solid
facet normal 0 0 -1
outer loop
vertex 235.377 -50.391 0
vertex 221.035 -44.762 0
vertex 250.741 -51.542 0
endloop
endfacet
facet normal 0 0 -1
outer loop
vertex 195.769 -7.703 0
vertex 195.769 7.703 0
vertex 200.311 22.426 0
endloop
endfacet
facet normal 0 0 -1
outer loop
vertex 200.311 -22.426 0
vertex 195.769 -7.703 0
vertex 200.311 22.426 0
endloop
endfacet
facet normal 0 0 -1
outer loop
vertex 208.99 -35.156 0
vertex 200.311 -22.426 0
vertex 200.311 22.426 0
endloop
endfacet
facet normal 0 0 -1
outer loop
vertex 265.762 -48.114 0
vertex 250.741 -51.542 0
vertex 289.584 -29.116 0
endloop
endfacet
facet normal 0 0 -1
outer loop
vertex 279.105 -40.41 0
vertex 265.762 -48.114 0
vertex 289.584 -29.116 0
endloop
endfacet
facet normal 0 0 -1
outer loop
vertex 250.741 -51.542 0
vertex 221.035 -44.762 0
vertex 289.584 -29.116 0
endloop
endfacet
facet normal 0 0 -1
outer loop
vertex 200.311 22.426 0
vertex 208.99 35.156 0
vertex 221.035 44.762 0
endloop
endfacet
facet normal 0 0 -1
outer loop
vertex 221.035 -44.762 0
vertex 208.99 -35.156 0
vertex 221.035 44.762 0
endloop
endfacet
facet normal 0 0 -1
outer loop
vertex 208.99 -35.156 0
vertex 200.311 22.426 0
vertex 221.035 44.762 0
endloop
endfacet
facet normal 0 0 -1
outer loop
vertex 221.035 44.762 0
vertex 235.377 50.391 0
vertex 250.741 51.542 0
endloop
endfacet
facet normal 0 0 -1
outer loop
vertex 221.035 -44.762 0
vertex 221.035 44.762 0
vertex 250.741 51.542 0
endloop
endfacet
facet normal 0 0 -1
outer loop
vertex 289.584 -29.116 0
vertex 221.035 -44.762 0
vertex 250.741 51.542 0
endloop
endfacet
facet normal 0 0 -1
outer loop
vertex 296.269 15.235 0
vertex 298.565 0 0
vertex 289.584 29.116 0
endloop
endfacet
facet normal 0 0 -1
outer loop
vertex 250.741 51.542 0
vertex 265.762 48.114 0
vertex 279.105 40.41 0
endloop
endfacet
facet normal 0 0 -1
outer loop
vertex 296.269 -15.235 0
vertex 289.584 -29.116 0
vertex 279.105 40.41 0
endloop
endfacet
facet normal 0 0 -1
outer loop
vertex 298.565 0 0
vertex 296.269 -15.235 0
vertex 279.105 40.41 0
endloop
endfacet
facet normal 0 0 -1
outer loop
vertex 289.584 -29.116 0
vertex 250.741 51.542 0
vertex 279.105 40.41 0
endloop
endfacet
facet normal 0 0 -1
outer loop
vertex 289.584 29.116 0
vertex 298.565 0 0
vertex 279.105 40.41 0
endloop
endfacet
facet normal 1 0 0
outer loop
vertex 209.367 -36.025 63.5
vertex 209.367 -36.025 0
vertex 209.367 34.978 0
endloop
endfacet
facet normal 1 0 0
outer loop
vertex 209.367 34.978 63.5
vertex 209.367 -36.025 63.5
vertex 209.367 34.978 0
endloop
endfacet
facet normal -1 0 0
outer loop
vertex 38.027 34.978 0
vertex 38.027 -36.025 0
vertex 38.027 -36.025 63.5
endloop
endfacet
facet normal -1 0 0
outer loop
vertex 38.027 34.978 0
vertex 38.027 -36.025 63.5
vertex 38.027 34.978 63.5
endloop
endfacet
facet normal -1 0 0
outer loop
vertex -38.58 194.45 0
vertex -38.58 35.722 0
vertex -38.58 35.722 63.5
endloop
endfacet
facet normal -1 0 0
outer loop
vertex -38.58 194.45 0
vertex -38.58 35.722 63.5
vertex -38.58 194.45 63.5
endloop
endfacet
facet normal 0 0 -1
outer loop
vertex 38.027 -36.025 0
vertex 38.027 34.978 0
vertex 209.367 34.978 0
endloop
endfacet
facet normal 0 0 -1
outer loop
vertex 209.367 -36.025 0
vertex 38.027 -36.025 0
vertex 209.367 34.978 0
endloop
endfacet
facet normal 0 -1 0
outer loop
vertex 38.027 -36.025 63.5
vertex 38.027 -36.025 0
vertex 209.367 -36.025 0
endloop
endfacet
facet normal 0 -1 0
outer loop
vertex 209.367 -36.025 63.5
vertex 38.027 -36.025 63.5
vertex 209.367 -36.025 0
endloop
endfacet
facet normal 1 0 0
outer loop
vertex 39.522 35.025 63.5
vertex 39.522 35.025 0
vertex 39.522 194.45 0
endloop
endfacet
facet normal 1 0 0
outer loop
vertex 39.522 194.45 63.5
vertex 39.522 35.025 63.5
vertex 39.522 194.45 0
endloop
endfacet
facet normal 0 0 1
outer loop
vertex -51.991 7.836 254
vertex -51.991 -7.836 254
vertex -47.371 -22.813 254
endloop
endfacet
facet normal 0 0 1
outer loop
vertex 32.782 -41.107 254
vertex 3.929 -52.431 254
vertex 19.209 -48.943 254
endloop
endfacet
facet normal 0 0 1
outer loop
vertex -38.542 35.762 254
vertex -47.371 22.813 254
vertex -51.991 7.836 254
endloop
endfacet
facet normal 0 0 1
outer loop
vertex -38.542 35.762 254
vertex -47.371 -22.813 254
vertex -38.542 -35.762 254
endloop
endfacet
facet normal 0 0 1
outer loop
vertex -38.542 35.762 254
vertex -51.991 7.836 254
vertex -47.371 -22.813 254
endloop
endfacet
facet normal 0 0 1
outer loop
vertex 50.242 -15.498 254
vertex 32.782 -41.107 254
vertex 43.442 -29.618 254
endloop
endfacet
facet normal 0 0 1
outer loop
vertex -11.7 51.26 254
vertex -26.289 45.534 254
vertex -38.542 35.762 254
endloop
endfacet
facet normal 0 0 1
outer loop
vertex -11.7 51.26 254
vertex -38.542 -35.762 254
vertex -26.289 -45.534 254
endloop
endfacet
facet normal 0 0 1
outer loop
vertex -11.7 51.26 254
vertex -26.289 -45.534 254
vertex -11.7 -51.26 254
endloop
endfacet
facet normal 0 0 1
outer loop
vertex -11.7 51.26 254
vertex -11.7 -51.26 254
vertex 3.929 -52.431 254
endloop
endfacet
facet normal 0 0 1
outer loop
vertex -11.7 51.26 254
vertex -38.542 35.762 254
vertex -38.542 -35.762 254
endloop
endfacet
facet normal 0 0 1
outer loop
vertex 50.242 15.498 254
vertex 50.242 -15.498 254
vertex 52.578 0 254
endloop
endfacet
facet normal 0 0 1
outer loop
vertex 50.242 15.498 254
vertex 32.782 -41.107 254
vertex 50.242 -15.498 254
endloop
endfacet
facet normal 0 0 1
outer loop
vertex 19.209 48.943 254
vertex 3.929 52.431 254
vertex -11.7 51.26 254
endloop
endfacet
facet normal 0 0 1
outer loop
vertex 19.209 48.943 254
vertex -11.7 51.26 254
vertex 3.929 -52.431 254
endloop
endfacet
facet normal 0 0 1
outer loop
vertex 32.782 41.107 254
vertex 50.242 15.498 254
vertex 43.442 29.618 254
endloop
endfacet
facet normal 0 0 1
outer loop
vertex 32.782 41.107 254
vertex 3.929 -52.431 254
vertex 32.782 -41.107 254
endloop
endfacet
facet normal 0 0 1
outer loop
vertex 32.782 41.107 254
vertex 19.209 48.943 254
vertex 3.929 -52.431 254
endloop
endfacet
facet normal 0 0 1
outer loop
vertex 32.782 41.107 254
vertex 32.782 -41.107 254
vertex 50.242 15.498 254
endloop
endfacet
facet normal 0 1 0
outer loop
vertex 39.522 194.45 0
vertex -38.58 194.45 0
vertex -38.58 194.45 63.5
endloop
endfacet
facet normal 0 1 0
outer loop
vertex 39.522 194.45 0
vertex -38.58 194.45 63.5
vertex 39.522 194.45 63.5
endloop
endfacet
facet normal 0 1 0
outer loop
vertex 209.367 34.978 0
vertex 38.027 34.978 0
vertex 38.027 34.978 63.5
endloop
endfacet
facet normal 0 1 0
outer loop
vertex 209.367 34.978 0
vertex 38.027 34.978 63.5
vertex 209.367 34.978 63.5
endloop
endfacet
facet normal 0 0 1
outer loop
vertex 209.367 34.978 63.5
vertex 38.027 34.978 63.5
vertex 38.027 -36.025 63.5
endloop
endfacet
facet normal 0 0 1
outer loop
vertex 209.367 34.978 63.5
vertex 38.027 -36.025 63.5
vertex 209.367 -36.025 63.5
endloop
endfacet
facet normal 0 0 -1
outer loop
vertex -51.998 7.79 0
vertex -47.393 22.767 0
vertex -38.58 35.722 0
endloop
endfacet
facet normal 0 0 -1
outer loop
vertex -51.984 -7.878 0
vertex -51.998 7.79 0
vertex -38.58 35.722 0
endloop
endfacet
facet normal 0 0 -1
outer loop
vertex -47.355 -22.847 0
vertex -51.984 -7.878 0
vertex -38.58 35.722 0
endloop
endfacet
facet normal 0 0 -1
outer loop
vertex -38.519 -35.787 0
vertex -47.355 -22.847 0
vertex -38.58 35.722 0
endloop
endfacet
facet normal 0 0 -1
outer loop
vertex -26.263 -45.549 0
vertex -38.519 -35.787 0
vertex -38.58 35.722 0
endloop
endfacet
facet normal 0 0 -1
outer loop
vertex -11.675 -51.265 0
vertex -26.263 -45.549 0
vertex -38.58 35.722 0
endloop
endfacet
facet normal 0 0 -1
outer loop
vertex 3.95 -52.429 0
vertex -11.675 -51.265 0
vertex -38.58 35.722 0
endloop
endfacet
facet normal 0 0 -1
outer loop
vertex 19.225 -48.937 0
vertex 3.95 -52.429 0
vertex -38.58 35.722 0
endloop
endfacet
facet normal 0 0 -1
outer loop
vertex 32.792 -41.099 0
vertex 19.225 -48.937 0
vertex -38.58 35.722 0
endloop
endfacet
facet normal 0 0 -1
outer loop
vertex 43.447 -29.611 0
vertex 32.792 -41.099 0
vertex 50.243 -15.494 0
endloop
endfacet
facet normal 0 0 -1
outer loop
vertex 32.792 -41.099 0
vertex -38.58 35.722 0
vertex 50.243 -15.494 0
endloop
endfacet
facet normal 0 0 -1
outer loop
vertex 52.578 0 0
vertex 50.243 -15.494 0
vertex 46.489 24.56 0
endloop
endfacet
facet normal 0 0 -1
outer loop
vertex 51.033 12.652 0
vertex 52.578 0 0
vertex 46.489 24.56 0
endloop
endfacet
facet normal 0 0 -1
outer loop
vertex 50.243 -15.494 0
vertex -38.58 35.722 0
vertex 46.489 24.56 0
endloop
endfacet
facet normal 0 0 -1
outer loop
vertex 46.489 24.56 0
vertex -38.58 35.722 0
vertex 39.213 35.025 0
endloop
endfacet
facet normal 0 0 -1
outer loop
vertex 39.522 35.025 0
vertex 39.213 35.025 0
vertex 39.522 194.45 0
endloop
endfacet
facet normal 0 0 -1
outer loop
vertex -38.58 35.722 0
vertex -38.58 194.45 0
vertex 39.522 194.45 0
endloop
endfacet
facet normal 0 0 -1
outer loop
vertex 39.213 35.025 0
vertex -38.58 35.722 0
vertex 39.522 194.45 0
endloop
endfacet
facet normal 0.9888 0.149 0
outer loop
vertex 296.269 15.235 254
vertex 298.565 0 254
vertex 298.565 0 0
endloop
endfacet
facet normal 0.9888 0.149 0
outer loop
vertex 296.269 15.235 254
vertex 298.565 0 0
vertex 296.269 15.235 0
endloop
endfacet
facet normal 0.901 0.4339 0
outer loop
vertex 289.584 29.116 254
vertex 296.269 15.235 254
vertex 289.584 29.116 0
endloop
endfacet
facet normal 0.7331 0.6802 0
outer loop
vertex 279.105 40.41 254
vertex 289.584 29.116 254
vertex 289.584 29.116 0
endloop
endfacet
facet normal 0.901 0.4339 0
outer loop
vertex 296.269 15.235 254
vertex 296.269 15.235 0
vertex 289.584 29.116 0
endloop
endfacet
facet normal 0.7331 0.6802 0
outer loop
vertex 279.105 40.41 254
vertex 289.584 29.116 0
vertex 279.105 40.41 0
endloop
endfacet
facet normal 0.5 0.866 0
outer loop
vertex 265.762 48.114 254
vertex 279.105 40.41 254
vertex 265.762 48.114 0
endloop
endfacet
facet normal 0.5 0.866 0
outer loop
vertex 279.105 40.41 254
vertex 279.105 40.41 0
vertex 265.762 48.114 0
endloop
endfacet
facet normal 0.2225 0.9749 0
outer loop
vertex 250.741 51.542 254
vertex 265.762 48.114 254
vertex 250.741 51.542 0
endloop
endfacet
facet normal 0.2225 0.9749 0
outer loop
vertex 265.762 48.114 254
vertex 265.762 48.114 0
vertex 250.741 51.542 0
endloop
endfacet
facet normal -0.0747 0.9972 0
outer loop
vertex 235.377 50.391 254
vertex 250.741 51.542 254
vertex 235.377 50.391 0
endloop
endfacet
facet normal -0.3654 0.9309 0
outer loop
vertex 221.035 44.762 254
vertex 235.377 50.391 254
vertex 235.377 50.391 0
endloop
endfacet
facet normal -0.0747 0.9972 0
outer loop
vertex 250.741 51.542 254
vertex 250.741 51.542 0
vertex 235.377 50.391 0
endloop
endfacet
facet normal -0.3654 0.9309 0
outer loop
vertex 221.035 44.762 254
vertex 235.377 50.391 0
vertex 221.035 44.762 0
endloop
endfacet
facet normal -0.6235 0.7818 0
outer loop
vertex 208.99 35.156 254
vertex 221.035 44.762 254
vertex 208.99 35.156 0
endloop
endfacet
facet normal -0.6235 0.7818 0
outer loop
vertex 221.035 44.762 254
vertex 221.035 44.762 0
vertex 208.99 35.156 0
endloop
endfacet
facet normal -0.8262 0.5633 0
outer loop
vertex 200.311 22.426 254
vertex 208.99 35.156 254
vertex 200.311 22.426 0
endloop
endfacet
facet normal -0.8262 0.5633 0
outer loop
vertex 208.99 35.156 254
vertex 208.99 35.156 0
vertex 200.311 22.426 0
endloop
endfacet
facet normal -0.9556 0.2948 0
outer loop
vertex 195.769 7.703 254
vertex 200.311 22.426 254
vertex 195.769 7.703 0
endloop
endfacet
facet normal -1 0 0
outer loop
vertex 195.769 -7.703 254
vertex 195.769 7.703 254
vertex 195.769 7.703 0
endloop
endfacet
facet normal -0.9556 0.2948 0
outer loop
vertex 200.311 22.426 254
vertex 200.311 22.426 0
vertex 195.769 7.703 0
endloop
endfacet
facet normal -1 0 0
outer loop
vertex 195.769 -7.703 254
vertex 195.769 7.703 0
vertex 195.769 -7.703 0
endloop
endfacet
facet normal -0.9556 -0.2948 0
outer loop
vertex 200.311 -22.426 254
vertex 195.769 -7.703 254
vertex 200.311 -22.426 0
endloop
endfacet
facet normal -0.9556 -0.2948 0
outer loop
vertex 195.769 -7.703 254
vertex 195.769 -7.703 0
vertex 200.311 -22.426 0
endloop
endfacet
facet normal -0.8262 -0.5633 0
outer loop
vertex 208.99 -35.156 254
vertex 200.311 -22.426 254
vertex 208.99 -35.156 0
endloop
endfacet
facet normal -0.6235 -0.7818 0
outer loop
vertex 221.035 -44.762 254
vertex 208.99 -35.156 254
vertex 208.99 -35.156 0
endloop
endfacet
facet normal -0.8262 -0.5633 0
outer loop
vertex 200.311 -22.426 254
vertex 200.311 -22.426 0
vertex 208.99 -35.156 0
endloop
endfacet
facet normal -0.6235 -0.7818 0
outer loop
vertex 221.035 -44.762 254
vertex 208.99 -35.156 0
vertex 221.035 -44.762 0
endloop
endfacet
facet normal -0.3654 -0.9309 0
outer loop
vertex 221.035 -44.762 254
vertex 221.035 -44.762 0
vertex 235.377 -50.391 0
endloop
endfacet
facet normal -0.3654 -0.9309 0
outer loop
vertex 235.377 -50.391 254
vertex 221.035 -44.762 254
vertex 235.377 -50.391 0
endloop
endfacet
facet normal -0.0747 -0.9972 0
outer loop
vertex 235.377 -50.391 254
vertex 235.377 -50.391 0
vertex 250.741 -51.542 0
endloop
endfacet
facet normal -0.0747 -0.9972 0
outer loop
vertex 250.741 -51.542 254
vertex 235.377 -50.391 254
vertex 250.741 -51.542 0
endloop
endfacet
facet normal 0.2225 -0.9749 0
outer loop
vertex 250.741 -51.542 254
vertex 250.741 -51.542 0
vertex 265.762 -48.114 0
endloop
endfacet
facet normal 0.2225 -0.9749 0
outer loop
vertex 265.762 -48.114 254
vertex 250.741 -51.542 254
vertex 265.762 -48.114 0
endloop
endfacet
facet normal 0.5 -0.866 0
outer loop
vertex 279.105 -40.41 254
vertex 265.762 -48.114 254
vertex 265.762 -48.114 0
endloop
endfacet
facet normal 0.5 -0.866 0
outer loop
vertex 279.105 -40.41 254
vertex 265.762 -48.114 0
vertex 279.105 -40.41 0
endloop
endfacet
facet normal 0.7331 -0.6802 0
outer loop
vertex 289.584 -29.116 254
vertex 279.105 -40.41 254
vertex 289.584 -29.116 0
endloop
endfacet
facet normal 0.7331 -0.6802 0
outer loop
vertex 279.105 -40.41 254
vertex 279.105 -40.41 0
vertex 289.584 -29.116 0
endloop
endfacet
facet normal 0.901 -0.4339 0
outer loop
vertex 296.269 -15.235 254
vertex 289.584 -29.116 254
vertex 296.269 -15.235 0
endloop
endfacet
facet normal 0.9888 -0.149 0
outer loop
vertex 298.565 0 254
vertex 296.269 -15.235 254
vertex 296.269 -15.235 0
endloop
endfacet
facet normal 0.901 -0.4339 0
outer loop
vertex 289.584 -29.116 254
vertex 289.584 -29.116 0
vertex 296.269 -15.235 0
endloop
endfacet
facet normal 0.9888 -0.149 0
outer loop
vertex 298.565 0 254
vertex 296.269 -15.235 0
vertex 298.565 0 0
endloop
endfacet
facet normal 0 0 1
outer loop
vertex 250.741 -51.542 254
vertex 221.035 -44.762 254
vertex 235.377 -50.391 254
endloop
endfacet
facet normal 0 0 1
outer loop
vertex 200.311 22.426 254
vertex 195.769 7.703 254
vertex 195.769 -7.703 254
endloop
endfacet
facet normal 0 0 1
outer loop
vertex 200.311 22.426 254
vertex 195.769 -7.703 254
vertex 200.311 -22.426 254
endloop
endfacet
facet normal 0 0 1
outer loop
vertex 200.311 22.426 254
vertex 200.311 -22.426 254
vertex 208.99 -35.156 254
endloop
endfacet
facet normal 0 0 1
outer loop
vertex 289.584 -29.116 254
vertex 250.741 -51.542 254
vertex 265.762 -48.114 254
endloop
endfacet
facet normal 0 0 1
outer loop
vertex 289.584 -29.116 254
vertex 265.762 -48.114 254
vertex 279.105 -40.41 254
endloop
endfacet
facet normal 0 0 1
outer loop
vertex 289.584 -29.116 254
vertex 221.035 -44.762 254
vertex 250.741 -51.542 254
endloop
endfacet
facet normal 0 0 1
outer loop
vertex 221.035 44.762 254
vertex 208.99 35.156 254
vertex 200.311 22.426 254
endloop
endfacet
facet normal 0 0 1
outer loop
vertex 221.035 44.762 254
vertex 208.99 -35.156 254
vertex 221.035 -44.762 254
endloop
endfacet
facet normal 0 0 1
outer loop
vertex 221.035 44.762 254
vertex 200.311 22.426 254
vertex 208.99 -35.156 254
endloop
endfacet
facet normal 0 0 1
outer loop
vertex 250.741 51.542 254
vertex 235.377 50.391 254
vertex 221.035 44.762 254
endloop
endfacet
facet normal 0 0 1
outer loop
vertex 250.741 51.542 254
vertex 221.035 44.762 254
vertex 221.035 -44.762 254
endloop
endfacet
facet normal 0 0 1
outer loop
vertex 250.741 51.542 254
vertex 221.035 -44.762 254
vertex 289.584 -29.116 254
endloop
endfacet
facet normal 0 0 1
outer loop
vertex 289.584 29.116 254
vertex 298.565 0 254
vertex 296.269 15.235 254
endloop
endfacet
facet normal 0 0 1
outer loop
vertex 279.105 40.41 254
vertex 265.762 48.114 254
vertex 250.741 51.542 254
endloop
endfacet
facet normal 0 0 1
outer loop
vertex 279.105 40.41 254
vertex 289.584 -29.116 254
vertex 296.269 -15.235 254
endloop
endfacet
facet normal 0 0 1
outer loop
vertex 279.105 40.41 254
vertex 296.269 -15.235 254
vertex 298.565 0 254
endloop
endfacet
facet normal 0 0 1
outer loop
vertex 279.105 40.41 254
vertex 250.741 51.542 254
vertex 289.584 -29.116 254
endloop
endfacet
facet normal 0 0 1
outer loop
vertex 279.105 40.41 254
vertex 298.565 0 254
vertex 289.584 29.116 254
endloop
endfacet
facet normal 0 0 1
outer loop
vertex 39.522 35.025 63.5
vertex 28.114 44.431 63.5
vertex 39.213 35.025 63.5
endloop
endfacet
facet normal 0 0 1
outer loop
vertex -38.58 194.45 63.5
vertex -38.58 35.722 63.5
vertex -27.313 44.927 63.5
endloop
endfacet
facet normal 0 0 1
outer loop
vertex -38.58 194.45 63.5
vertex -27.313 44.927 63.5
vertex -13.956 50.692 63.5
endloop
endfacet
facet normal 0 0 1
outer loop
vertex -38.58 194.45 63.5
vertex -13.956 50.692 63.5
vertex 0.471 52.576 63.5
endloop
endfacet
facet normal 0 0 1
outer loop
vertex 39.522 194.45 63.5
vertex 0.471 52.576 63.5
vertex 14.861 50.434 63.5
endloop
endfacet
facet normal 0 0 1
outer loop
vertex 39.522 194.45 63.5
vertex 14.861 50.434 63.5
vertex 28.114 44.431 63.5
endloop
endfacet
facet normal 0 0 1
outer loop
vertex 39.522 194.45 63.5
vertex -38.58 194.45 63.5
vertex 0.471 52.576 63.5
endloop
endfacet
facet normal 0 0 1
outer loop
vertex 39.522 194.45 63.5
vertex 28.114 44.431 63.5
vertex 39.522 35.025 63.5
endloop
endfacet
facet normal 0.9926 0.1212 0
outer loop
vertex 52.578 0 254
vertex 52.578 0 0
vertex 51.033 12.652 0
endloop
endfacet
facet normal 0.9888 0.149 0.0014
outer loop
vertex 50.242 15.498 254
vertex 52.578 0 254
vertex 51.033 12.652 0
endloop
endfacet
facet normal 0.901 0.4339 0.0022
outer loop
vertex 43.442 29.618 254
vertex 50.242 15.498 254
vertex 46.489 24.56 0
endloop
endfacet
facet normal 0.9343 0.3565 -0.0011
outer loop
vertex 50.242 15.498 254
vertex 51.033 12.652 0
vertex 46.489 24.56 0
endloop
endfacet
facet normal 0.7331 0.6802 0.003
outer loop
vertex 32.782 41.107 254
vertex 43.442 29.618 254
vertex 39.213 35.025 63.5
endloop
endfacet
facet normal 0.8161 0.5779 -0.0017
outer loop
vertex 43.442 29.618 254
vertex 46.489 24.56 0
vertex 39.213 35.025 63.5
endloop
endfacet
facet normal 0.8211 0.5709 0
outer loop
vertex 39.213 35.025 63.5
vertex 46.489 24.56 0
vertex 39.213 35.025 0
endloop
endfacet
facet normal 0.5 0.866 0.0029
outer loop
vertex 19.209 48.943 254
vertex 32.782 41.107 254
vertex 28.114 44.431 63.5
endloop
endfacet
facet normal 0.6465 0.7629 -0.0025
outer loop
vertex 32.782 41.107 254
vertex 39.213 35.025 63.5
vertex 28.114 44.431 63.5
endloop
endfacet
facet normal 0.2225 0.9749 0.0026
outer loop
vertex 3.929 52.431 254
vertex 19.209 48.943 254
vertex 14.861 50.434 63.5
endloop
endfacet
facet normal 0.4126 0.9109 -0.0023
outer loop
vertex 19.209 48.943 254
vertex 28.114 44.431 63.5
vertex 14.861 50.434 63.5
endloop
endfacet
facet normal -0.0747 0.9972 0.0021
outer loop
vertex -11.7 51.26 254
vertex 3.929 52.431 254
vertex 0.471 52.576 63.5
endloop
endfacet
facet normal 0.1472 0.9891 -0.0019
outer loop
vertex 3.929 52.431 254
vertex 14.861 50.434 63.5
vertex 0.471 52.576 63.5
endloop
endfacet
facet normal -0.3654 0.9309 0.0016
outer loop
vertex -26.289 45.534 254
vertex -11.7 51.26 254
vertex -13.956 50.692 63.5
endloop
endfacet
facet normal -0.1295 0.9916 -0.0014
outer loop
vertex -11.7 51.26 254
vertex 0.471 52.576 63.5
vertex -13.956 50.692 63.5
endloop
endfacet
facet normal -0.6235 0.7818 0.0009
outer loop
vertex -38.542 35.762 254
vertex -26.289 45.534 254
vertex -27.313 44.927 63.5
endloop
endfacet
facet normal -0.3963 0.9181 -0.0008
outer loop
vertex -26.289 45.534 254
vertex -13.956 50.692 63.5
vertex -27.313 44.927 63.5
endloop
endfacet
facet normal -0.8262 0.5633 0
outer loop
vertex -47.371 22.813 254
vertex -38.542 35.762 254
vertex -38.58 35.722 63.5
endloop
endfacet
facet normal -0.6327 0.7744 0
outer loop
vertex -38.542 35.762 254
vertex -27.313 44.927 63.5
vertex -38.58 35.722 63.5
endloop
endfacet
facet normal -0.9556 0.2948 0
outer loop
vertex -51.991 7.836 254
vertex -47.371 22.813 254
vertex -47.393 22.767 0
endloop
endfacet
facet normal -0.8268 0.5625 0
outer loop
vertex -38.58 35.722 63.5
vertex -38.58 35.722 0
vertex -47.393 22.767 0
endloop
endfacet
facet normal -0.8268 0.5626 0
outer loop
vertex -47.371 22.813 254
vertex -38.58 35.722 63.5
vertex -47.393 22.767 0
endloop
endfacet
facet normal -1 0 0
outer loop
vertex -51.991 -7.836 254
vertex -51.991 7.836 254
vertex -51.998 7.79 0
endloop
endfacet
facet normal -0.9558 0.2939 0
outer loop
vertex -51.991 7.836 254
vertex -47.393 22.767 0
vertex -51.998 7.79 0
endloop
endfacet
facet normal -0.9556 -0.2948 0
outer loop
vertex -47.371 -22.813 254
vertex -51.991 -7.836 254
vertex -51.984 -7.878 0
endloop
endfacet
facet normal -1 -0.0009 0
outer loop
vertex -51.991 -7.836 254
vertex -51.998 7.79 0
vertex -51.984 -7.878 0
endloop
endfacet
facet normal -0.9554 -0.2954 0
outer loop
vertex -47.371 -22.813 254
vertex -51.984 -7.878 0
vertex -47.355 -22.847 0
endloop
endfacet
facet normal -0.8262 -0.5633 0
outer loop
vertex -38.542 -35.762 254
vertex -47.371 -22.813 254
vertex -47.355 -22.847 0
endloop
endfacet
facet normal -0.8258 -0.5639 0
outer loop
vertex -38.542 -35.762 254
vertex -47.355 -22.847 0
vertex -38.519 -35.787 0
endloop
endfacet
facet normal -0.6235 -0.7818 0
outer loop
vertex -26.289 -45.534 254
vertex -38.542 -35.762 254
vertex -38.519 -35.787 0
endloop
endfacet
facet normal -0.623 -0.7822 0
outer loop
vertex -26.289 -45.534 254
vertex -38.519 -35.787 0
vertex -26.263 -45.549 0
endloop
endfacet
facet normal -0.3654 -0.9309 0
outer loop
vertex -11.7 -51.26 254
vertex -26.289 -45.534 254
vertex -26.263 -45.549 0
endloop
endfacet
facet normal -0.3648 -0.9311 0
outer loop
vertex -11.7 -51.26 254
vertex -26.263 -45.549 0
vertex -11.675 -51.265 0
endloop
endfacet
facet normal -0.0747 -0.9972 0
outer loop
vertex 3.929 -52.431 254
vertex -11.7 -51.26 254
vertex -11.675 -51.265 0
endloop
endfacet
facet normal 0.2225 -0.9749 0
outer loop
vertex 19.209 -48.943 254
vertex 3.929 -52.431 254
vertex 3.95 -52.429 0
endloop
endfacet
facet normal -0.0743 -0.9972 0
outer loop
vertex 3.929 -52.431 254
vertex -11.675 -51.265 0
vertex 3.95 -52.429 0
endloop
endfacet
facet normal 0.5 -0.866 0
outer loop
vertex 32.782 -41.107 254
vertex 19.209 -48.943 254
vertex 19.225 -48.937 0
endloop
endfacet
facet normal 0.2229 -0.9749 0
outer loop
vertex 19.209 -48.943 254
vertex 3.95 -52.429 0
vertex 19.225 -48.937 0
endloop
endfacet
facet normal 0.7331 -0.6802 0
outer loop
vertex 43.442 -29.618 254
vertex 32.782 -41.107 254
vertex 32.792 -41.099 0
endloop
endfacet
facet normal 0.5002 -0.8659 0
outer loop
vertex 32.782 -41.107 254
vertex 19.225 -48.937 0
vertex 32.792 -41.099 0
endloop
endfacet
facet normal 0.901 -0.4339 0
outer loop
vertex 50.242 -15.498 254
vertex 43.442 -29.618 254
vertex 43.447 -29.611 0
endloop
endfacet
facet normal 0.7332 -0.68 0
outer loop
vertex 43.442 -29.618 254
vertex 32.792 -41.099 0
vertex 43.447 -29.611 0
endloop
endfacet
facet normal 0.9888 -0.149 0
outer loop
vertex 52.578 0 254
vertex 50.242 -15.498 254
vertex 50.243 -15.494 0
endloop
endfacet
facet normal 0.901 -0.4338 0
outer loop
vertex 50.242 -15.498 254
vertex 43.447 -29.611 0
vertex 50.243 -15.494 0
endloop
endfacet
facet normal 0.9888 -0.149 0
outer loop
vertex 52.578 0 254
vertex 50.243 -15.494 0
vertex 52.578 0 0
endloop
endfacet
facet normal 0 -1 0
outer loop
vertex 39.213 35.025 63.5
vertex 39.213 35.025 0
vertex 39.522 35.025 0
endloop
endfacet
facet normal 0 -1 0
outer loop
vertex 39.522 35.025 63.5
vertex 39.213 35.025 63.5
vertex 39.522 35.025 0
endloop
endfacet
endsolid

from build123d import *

# Parameters (mm, degrees)
F0_R     = 52.578
F1_DEPTH = 254
F2_R     = 51.686667
F3_DEPTH = 254
F4_W     = 171.340269
F4_H     = 71.002875
F5_DEPTH = 63.5
F6_W     = 78.101962
F6_H     = 159.424633
F7_DEPTH = 63.5


with BuildPart() as f1:
    # F0 (on Top) → F1 (new body)
    with BuildSketch(Plane.XY):
        Circle(F0_R)
    extrude(amount=F1_DEPTH)

    # F6 (on Top) → F7 (join)
    with BuildSketch(Plane.XY):
        with Locations((0.47113, 114.737421)):
            Rectangle(F6_W, F6_H)
    extrude(amount=F7_DEPTH)


with BuildPart() as f3:
    # F2 (on Top) → F3 (new body)
    with BuildSketch(Plane.XY):
        with Locations((246.878713, 0)):
            Circle(F2_R)
    extrude(amount=F3_DEPTH)


with BuildPart() as f5:
    # F4 (on Top) → F5 (new body)
    with BuildSketch(Plane.XY):
        with Locations((123.697097, -0.523413)):
            Rectangle(F4_W, F4_H)
    extrude(amount=F5_DEPTH)


solid = Compound([f1.part, f3.part, f5.part])
